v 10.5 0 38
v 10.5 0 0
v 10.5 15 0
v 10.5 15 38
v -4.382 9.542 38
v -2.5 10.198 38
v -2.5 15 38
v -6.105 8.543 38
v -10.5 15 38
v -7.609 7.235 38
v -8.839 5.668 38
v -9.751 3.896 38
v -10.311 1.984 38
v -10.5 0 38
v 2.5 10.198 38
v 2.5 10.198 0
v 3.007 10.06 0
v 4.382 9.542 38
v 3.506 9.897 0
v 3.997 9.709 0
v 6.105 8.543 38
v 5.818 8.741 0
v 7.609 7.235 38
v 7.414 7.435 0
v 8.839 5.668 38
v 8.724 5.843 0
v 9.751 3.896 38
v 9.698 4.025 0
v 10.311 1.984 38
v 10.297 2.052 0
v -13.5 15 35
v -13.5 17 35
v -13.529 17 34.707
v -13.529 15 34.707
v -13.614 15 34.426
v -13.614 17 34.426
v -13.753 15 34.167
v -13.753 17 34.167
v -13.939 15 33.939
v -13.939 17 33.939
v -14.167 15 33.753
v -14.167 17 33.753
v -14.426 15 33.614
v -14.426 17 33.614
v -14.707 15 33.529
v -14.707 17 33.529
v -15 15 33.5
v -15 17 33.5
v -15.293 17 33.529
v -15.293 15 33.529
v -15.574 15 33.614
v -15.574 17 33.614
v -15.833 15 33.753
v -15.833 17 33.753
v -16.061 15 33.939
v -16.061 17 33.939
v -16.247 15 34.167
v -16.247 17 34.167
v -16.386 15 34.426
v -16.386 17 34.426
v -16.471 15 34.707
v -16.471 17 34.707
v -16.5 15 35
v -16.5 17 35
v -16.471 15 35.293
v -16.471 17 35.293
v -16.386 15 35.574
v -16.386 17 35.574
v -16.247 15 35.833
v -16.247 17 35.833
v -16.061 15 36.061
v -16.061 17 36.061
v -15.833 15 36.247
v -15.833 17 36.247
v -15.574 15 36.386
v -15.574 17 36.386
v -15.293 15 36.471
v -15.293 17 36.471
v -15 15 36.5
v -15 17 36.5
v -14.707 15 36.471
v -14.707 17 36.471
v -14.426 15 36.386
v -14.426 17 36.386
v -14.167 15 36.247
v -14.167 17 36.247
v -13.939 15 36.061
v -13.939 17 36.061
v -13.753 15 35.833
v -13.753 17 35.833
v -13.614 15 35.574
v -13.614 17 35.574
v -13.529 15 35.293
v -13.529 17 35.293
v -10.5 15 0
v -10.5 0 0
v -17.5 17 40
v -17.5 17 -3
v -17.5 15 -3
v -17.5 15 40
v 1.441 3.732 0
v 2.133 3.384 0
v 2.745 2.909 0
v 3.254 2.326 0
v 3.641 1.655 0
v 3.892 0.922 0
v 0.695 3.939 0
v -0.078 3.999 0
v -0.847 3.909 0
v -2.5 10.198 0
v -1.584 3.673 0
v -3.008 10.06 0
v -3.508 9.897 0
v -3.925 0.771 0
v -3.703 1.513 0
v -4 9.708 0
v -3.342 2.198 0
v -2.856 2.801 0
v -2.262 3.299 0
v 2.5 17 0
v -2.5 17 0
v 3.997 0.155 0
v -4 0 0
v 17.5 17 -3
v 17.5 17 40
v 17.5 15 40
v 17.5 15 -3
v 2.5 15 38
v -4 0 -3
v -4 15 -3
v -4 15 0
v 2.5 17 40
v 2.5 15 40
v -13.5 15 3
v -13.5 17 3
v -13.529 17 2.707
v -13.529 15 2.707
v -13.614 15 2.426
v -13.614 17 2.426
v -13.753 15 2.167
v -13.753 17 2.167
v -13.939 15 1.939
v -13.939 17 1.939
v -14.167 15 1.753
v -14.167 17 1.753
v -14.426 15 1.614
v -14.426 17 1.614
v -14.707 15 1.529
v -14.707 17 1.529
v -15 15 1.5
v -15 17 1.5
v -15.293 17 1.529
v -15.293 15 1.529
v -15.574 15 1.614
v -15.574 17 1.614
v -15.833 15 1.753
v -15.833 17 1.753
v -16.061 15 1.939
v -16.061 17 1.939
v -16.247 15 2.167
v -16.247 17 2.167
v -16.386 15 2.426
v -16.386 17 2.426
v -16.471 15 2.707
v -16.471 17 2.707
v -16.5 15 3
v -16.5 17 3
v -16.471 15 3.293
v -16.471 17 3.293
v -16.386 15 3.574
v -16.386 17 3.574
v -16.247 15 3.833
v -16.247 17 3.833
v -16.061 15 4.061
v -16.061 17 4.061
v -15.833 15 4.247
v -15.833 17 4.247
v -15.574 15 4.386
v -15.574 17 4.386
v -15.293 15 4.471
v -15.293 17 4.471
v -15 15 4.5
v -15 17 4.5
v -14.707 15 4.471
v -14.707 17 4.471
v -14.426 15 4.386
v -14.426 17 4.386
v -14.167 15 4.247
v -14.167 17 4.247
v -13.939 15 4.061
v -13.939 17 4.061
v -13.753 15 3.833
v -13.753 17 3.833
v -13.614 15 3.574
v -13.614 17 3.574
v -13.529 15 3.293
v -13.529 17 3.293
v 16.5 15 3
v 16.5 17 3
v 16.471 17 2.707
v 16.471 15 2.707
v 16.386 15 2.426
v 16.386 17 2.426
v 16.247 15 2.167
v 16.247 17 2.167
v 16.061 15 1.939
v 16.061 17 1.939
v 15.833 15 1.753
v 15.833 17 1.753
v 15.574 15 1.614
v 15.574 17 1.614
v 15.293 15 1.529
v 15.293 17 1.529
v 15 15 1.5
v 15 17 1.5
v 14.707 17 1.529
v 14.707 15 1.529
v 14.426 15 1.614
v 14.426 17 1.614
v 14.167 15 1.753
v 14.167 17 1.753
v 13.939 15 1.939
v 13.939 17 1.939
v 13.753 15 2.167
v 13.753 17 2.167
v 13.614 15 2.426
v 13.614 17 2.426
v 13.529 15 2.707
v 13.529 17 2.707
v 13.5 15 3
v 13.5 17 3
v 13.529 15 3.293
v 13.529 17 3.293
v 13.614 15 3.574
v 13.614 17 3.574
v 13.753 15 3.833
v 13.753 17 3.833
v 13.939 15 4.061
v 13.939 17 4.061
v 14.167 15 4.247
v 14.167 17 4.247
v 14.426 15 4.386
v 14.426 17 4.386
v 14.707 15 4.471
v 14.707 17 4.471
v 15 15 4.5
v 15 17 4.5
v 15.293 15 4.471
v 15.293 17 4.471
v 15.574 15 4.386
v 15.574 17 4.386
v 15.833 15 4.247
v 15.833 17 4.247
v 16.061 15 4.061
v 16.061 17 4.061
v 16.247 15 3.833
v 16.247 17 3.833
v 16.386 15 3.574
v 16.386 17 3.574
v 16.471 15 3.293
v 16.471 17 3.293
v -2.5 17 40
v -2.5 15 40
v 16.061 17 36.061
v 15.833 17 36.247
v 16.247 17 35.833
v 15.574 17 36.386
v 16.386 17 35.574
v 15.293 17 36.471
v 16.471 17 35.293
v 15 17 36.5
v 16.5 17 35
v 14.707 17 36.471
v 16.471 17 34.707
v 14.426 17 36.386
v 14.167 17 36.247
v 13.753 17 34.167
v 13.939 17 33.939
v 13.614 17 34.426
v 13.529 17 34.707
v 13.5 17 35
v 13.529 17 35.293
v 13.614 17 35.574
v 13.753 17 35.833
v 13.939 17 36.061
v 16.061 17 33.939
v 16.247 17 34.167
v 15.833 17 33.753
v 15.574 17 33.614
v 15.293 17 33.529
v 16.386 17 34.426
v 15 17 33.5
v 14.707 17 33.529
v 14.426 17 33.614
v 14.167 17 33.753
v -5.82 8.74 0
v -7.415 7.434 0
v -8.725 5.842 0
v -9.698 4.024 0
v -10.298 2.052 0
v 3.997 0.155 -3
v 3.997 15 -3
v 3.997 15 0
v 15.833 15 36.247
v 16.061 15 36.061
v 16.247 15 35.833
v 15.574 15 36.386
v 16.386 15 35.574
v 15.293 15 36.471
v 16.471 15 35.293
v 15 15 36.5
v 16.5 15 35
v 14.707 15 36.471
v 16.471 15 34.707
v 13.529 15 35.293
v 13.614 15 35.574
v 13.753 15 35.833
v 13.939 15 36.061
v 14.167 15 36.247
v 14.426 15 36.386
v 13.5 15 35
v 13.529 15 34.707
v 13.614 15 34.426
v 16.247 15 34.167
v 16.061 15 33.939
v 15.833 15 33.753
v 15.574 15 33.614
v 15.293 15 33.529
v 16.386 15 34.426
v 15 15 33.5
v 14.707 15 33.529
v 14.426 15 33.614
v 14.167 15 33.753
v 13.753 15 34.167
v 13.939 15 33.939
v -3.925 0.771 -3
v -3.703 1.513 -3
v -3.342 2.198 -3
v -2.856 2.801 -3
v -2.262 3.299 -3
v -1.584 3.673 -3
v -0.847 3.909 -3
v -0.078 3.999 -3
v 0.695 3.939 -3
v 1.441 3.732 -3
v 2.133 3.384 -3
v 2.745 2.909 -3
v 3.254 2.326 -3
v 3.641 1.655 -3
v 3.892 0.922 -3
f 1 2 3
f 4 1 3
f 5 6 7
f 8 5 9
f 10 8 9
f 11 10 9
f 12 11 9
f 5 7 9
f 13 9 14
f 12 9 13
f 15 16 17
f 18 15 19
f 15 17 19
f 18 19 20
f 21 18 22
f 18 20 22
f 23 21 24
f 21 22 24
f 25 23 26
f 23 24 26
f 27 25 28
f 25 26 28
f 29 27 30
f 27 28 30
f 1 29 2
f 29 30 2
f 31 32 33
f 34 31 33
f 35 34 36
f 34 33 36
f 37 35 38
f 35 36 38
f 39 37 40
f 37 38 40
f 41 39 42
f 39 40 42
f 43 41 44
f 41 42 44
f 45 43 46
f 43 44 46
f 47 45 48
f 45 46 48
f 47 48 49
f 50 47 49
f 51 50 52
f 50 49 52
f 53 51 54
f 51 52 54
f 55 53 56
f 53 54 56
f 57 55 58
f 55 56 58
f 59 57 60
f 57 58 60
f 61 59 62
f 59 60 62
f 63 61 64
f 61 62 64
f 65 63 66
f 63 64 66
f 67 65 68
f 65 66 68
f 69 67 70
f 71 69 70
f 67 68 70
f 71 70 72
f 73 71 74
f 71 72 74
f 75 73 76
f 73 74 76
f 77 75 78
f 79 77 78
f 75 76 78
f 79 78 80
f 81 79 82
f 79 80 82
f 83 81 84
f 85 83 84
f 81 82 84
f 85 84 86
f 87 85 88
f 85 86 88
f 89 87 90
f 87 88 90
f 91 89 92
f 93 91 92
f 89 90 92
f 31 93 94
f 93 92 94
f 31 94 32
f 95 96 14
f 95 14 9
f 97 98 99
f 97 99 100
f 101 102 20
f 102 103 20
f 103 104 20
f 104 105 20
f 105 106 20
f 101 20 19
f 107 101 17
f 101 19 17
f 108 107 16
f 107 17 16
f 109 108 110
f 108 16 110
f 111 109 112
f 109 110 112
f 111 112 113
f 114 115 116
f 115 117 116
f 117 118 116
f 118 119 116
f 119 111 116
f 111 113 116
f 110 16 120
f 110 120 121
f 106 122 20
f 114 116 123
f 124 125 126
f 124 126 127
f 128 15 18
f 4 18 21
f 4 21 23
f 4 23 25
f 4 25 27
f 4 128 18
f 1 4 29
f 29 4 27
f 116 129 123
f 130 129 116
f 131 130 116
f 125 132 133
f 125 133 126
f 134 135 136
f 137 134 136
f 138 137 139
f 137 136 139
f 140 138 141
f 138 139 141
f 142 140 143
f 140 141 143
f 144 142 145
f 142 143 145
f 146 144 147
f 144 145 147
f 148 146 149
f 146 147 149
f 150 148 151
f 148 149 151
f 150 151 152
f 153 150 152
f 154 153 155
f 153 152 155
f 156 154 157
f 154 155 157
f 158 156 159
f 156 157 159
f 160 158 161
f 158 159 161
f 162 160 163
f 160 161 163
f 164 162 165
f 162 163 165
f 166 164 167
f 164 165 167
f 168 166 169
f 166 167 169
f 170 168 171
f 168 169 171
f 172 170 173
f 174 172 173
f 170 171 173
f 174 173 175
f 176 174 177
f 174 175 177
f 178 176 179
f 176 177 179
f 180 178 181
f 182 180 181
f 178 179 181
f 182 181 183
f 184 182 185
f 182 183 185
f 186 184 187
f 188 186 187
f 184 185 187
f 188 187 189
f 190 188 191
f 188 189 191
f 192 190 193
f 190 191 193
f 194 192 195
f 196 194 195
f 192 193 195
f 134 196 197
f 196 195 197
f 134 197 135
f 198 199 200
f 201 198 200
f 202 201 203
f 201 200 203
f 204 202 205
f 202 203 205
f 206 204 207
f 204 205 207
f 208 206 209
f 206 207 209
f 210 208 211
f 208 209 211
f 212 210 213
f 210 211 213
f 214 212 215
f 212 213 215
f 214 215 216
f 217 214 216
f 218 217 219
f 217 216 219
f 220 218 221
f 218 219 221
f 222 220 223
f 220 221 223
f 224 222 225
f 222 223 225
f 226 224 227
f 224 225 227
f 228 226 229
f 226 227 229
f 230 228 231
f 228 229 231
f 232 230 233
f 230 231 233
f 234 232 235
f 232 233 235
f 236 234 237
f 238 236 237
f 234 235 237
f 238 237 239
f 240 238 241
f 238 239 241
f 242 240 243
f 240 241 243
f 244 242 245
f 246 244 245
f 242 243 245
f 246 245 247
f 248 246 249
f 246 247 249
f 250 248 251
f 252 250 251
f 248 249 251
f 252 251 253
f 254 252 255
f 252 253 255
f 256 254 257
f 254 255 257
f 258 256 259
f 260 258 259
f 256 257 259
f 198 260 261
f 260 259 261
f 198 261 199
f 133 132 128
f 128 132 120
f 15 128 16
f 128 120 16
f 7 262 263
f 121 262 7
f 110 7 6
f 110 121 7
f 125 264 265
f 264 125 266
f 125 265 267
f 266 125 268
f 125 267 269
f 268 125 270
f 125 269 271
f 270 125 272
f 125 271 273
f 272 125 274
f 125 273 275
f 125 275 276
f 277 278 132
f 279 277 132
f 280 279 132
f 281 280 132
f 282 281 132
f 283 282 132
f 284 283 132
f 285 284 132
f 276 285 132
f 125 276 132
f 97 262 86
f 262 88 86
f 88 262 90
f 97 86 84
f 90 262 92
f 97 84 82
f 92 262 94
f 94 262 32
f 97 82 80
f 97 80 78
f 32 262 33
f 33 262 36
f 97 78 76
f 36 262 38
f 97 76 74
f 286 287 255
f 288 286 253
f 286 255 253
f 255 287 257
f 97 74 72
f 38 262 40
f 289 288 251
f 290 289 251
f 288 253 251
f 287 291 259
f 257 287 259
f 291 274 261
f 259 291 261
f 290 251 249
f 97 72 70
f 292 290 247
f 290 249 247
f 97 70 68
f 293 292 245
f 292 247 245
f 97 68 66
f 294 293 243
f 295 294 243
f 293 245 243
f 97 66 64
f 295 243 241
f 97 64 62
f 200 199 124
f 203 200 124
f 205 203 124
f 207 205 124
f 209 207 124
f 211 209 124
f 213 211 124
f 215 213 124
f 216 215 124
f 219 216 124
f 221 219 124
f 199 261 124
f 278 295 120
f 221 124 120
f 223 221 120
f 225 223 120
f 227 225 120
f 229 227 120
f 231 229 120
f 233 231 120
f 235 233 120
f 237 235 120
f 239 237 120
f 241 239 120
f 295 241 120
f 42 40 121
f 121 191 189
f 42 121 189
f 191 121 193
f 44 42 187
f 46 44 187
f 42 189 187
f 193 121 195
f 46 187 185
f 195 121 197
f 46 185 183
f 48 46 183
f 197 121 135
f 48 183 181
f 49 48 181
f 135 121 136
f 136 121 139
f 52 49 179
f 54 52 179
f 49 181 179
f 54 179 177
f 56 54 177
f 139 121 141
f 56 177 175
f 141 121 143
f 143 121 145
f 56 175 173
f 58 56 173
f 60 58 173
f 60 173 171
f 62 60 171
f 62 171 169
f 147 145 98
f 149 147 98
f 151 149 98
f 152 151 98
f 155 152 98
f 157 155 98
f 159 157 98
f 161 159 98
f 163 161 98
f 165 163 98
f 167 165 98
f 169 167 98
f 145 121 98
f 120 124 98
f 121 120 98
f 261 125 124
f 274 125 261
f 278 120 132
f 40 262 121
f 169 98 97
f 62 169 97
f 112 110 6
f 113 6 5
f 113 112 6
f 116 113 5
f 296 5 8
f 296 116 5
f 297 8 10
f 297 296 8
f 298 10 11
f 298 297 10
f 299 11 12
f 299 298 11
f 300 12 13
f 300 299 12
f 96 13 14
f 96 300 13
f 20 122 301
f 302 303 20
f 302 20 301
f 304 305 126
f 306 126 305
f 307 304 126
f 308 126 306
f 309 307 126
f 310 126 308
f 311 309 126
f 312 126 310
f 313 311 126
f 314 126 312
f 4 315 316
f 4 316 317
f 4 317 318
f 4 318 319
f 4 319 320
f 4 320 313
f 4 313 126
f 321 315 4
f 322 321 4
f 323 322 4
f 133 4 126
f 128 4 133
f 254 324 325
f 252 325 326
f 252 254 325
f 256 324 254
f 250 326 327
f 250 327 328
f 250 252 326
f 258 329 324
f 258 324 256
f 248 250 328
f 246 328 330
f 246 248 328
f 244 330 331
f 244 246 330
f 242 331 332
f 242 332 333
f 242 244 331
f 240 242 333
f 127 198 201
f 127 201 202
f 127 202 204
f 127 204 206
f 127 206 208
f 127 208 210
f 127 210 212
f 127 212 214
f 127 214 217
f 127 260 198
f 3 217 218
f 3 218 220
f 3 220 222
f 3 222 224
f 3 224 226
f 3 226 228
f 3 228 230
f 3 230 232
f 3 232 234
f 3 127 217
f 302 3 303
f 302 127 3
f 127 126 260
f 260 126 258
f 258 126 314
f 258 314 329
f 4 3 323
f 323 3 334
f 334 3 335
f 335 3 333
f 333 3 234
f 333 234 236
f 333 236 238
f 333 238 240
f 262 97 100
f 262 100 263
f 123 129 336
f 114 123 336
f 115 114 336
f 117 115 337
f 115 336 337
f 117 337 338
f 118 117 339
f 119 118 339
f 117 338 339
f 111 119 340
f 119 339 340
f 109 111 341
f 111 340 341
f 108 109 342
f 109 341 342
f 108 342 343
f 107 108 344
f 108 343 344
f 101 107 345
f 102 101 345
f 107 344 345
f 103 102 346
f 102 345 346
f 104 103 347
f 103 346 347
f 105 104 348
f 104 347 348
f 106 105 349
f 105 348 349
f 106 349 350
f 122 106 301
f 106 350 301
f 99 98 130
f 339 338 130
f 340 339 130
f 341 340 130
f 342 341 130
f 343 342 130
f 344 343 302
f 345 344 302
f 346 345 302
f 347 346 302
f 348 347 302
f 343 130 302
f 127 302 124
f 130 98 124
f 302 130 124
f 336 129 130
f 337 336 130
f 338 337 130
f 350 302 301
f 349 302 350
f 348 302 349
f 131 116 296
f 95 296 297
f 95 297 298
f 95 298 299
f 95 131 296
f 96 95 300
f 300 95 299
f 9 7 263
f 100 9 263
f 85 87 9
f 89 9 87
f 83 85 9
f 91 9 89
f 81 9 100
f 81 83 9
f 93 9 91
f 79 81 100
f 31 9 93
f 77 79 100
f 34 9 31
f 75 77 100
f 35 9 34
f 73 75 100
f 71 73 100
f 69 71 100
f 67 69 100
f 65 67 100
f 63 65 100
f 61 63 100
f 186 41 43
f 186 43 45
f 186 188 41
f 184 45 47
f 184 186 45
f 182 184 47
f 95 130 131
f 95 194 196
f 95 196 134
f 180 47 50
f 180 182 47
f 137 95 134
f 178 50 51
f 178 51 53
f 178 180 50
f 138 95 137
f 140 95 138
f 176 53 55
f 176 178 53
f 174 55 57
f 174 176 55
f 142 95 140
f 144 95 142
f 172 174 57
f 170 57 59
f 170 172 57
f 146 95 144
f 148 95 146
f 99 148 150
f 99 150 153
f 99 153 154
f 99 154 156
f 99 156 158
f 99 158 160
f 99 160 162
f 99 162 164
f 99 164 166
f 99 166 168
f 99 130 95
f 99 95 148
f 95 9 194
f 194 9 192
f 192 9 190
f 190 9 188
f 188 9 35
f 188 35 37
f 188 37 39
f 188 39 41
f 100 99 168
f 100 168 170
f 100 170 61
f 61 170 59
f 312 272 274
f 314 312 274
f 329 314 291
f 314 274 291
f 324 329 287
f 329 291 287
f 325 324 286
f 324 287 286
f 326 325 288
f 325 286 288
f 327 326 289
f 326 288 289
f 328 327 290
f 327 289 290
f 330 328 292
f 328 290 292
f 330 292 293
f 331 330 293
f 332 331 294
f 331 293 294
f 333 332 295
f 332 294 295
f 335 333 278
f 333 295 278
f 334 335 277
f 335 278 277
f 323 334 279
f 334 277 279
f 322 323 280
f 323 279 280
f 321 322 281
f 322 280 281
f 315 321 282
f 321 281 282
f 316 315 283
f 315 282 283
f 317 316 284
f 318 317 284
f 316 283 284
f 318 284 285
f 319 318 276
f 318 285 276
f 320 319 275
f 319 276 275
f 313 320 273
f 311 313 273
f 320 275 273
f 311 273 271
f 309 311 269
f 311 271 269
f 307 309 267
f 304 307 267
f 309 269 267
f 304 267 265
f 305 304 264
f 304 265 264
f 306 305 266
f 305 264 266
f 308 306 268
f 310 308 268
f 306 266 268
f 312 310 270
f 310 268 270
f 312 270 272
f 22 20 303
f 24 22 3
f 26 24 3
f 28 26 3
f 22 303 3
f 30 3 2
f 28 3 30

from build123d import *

# Parameters (mm, degrees)
SALIENTE_EXTRUIR1_DEPTH   = 38
SALIENTE_EXTRUIR1_2_DEPTH = 38
CROQUIS2_R                = 1.5
SALIENTE_EXTRUIR2_DEPTH   = 2
SALIENTE_EXTRUIR4_DEPTH   = 17
CROQUIS4_R                = 4
CORTAR_EXTRUIR2_DEPTH     = 17


with BuildPart() as part:
    # Croquis1 → Saliente-Extruir1 (new body)
    with BuildSketch(Plane.XY):
        with BuildLine():
            Line((10.5, 0), (10.5, 10.5))
            Line((10.5, 10.5), (10.5, 17))
            Line((10.5, 17), (2.5, 17))
            Line((2.5, 17), (2.5, 10.198039027))
            ThreePointArc((2.5, 10.198039027), (8.261355821, 6.480740698), (10.5, 0))
        make_face()
    extrude(amount=SALIENTE_EXTRUIR1_DEPTH)



with BuildPart() as body_2:
    # Croquis1 → Saliente-Extruir1 2 (new body)
    with BuildSketch(Plane.XY):
        with BuildLine():
            Line((-10.5, 0), (-10.5, 10.5))
            Line((-10.5, 10.5), (-10.5, 17))
            Line((-10.5, 17), (-2.5, 17))
            Line((-2.5, 17), (-2.5, 10.198039027))
            ThreePointArc((-2.5, 10.198039027), (-8.261355821, 6.480740698), (-10.5, 0))
        make_face()
    extrude(amount=SALIENTE_EXTRUIR1_2_DEPTH)


with BuildPart() as part_1:
    add(part.part)

    add(body_2.part)  # Saliente-Extruir2 merges body 2
    # Croquis2 → Saliente-Extruir2 (add)
    with BuildSketch(Plane(origin=(0, 17, 0), x_dir=(1, 0, 0), z_dir=(0, 1, 0))):
        Polygon((2.5, 0), (-2.5, 0), (-2.5, -40), (-12.5, -40), (-17.5, -40), (-17.5, 2), (-17.5, 3), (17.5, 3), (17.5, 2), (17.5, -40), (12.5, -40), (2.5, -40), align=None)
        with Locations((-15, -3)):
            Circle(CROQUIS2_R, mode=Mode.SUBTRACT)
        with Locations((15, -3)):
            Circle(CROQUIS2_R, mode=Mode.SUBTRACT)
        with Locations((15, -35)):
            Circle(CROQUIS2_R, mode=Mode.SUBTRACT)
        with Locations((-15, -35)):
            Circle(CROQUIS2_R, mode=Mode.SUBTRACT)
    extrude(amount=-SALIENTE_EXTRUIR2_DEPTH)

    # Croquis3 → Saliente-Extruir4 (add)
    with BuildSketch(Plane(origin=(0, 17, 0), x_dir=(1, 0, 0), z_dir=(0, 1, 0))):
        Polygon((0, 3), (-4, 3), (-4, 0), (3.996992923, 0), (3.996992923, 3), align=None)
    extrude(amount=-SALIENTE_EXTRUIR4_DEPTH)

    # Croquis4 → Cortar-Extruir2 (cut)
    with BuildSketch(Plane(origin=(0, 0, -3), x_dir=(-1, 0, 0), z_dir=(0, 0, -1))):
        Circle(CROQUIS4_R)
    extrude(amount=-CORTAR_EXTRUIR2_DEPTH, mode=Mode.SUBTRACT)


solid = part_1.part
